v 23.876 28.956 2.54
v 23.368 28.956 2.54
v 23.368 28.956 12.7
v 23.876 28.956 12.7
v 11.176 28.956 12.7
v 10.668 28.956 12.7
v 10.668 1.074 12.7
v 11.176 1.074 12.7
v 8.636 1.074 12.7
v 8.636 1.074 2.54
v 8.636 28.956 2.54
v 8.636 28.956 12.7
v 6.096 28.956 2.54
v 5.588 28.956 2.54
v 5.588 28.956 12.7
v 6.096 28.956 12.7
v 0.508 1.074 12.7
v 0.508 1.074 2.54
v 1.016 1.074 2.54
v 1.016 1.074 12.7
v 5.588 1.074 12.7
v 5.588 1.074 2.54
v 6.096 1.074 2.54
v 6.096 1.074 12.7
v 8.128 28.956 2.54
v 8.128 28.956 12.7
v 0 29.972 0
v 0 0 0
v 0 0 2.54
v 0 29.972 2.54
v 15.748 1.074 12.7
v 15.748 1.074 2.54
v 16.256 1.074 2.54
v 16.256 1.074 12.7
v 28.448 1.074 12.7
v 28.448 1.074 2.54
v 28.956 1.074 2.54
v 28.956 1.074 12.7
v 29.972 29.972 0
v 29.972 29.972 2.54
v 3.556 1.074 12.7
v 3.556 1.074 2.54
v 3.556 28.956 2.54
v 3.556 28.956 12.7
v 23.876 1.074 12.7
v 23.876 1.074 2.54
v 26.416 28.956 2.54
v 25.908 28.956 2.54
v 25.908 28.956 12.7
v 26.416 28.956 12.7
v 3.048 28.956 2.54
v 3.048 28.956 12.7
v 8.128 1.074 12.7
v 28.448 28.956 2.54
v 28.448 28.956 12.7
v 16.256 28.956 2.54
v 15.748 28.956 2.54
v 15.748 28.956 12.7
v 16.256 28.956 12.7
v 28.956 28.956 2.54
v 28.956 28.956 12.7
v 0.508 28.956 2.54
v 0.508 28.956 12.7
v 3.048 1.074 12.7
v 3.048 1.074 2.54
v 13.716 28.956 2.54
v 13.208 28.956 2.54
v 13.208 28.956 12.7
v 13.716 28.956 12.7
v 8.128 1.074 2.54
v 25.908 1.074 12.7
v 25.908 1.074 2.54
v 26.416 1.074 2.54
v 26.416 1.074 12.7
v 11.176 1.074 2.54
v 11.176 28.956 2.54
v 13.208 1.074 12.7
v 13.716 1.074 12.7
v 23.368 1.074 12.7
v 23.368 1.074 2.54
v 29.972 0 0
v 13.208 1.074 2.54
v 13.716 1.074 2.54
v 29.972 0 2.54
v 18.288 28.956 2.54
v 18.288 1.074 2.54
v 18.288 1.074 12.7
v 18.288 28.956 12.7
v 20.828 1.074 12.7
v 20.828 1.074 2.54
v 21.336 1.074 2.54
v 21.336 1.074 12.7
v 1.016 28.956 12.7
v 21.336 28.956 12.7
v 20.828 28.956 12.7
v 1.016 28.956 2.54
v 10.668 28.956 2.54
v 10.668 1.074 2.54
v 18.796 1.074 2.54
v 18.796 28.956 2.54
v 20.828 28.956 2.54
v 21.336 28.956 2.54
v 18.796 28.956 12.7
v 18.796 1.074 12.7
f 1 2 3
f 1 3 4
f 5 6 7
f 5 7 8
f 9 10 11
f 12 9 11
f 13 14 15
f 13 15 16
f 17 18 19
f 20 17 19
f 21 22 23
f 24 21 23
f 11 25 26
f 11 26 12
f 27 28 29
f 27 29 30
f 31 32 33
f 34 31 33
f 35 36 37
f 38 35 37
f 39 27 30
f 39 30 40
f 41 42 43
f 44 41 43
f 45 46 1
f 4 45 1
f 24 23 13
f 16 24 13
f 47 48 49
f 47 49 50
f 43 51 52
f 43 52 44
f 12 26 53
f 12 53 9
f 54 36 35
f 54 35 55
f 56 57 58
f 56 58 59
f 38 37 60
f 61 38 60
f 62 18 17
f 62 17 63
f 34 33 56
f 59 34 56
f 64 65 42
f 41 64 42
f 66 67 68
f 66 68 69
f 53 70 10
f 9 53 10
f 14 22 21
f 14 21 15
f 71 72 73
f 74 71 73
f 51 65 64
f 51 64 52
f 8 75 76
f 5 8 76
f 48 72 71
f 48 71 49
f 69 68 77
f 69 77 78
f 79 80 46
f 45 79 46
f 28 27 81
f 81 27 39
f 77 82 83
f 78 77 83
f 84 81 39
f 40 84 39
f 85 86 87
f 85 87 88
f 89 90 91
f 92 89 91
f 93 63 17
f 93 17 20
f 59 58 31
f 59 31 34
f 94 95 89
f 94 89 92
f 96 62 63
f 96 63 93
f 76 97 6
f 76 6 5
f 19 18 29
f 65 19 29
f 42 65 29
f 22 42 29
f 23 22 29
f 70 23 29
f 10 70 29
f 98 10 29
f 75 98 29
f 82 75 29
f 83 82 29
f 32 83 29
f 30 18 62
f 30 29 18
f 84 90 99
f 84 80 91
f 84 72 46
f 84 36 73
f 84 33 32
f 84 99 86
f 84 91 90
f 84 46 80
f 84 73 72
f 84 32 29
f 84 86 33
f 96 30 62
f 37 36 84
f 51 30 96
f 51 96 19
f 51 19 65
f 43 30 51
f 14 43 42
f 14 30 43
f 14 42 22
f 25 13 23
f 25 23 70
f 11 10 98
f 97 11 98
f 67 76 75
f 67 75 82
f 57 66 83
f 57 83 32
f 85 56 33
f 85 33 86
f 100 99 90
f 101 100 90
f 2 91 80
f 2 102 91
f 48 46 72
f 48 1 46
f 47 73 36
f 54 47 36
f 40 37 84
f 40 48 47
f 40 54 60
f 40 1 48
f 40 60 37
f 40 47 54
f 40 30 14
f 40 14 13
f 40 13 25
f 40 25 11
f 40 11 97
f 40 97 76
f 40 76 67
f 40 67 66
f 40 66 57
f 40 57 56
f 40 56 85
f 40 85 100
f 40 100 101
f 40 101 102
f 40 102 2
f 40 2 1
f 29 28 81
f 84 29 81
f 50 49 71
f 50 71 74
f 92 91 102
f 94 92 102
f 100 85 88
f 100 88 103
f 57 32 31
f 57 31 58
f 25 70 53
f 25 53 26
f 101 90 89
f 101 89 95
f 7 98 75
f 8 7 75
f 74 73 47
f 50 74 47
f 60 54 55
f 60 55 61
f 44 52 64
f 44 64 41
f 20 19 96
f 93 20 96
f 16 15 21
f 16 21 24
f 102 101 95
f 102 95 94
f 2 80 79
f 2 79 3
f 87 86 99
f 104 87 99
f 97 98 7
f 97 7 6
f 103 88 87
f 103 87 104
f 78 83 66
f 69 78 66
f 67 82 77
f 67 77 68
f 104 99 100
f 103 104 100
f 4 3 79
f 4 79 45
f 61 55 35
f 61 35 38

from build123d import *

# Parameters (mm, degrees)
F0_W     = 0.508
F0_H     = 27.8820712173
F1_DEPTH = 12.7
F0_W_2   = 29.972
F0_H_2   = 29.972
F2_DEPTH = 2.54


with BuildPart() as f1:
    # F0 (on Top) → F1 (new body)
    with BuildSketch(Plane.XY):
        with Locations((0.762, 15.0149643914)):
            Rectangle(F0_W, F0_H)
    extrude(amount=F1_DEPTH)



with BuildPart() as f1b:
    # F0 (on Top) → F1, piece 2 (new body)
    with BuildSketch(Plane.XY):
        with Locations((3.302, 15.0149643914)):
            Rectangle(F0_W, F0_H)
    extrude(amount=F1_DEPTH)


with BuildPart() as f1c:
    # F0 (on Top) → F1, piece 3 (new body)
    with BuildSketch(Plane.XY):
        with Locations((5.842, 15.0149643914)):
            Rectangle(F0_W, F0_H)
    extrude(amount=F1_DEPTH)


with BuildPart() as f1d:
    # F0 (on Top) → F1, piece 4 (new body)
    with BuildSketch(Plane.XY):
        with Locations((8.382, 15.0149643914)):
            Rectangle(F0_W, F0_H)
    extrude(amount=F1_DEPTH)


with BuildPart() as f1e:
    # F0 (on Top) → F1, piece 5 (new body)
    with BuildSketch(Plane.XY):
        with Locations((10.922, 15.0149643914)):
            Rectangle(F0_W, F0_H)
    extrude(amount=F1_DEPTH)


with BuildPart() as f1f:
    # F0 (on Top) → F1, piece 6 (new body)
    with BuildSketch(Plane.XY):
        with Locations((13.462, 15.0149643914)):
            Rectangle(F0_W, F0_H)
    extrude(amount=F1_DEPTH)


with BuildPart() as f1g:
    # F0 (on Top) → F1, piece 7 (new body)
    with BuildSketch(Plane.XY):
        with Locations((16.002, 15.0149643914)):
            Rectangle(F0_W, F0_H)
    extrude(amount=F1_DEPTH)


with BuildPart() as f1h:
    # F0 (on Top) → F1, piece 8 (new body)
    with BuildSketch(Plane.XY):
        with Locations((18.542, 15.0149643914)):
            Rectangle(F0_W, F0_H)
    extrude(amount=F1_DEPTH)


with BuildPart() as f1i:
    # F0 (on Top) → F1, piece 9 (new body)
    with BuildSketch(Plane.XY):
        with Locations((21.082, 15.0149643914)):
            Rectangle(F0_W, F0_H)
    extrude(amount=F1_DEPTH)


with BuildPart() as f1j:
    # F0 (on Top) → F1, piece 10 (new body)
    with BuildSketch(Plane.XY):
        with Locations((23.622, 15.0149643914)):
            Rectangle(F0_W, F0_H)
    extrude(amount=F1_DEPTH)


with BuildPart() as f1k:
    # F0 (on Top) → F1, piece 11 (new body)
    with BuildSketch(Plane.XY):
        with Locations((26.162, 15.0149643914)):
            Rectangle(F0_W, F0_H)
    extrude(amount=F1_DEPTH)


with BuildPart() as f1l:
    # F0 (on Top) → F1, piece 12 (new body)
    with BuildSketch(Plane.XY):
        with Locations((28.702, 15.0149643914)):
            Rectangle(F0_W, F0_H)
    extrude(amount=F1_DEPTH)


with BuildPart() as f1_1:
    add(f1.part)

    add(f1b.part)  # F2 merges F1b

    add(f1c.part)  # F2 merges F1c

    add(f1d.part)  # F2 merges F1d

    add(f1e.part)  # F2 merges F1e

    add(f1f.part)  # F2 merges F1f

    add(f1g.part)  # F2 merges F1g

    add(f1h.part)  # F2 merges F1h

    add(f1i.part)  # F2 merges F1i

    add(f1j.part)  # F2 merges F1j

    add(f1k.part)  # F2 merges F1k

    add(f1l.part)  # F2 merges F1l
    # F0 (on Top) → F2 (join)
    with BuildSketch(Plane.XY):
        with Locations((14.986, 14.986)):
            Rectangle(F0_W_2, F0_H_2)
        with Locations((0.762, 15.0149643914)):
            Rectangle(F0_W, F0_H, mode=Mode.SUBTRACT)
        with Locations((3.302, 15.0149643914)):
            Rectangle(F0_W, F0_H, mode=Mode.SUBTRACT)
        with Locations((5.842, 15.0149643914)):
            Rectangle(F0_W, F0_H, mode=Mode.SUBTRACT)
        with Locations((8.382, 15.0149643914)):
            Rectangle(F0_W, F0_H, mode=Mode.SUBTRACT)
        with Locations((10.922, 15.0149643914)):
            Rectangle(F0_W, F0_H, mode=Mode.SUBTRACT)
        with Locations((13.462, 15.0149643914)):
            Rectangle(F0_W, F0_H, mode=Mode.SUBTRACT)
        with Locations((16.002, 15.0149643914)):
            Rectangle(F0_W, F0_H, mode=Mode.SUBTRACT)
        with Locations((18.542, 15.0149643914)):
            Rectangle(F0_W, F0_H, mode=Mode.SUBTRACT)
        with Locations((21.082, 15.0149643914)):
            Rectangle(F0_W, F0_H, mode=Mode.SUBTRACT)
        with Locations((23.622, 15.0149643914)):
            Rectangle(F0_W, F0_H, mode=Mode.SUBTRACT)
        with Locations((26.162, 15.0149643914)):
            Rectangle(F0_W, F0_H, mode=Mode.SUBTRACT)
        with Locations((28.702, 15.0149643914)):
            Rectangle(F0_W, F0_H, mode=Mode.SUBTRACT)
    extrude(amount=F2_DEPTH)


solid = f1_1.part
